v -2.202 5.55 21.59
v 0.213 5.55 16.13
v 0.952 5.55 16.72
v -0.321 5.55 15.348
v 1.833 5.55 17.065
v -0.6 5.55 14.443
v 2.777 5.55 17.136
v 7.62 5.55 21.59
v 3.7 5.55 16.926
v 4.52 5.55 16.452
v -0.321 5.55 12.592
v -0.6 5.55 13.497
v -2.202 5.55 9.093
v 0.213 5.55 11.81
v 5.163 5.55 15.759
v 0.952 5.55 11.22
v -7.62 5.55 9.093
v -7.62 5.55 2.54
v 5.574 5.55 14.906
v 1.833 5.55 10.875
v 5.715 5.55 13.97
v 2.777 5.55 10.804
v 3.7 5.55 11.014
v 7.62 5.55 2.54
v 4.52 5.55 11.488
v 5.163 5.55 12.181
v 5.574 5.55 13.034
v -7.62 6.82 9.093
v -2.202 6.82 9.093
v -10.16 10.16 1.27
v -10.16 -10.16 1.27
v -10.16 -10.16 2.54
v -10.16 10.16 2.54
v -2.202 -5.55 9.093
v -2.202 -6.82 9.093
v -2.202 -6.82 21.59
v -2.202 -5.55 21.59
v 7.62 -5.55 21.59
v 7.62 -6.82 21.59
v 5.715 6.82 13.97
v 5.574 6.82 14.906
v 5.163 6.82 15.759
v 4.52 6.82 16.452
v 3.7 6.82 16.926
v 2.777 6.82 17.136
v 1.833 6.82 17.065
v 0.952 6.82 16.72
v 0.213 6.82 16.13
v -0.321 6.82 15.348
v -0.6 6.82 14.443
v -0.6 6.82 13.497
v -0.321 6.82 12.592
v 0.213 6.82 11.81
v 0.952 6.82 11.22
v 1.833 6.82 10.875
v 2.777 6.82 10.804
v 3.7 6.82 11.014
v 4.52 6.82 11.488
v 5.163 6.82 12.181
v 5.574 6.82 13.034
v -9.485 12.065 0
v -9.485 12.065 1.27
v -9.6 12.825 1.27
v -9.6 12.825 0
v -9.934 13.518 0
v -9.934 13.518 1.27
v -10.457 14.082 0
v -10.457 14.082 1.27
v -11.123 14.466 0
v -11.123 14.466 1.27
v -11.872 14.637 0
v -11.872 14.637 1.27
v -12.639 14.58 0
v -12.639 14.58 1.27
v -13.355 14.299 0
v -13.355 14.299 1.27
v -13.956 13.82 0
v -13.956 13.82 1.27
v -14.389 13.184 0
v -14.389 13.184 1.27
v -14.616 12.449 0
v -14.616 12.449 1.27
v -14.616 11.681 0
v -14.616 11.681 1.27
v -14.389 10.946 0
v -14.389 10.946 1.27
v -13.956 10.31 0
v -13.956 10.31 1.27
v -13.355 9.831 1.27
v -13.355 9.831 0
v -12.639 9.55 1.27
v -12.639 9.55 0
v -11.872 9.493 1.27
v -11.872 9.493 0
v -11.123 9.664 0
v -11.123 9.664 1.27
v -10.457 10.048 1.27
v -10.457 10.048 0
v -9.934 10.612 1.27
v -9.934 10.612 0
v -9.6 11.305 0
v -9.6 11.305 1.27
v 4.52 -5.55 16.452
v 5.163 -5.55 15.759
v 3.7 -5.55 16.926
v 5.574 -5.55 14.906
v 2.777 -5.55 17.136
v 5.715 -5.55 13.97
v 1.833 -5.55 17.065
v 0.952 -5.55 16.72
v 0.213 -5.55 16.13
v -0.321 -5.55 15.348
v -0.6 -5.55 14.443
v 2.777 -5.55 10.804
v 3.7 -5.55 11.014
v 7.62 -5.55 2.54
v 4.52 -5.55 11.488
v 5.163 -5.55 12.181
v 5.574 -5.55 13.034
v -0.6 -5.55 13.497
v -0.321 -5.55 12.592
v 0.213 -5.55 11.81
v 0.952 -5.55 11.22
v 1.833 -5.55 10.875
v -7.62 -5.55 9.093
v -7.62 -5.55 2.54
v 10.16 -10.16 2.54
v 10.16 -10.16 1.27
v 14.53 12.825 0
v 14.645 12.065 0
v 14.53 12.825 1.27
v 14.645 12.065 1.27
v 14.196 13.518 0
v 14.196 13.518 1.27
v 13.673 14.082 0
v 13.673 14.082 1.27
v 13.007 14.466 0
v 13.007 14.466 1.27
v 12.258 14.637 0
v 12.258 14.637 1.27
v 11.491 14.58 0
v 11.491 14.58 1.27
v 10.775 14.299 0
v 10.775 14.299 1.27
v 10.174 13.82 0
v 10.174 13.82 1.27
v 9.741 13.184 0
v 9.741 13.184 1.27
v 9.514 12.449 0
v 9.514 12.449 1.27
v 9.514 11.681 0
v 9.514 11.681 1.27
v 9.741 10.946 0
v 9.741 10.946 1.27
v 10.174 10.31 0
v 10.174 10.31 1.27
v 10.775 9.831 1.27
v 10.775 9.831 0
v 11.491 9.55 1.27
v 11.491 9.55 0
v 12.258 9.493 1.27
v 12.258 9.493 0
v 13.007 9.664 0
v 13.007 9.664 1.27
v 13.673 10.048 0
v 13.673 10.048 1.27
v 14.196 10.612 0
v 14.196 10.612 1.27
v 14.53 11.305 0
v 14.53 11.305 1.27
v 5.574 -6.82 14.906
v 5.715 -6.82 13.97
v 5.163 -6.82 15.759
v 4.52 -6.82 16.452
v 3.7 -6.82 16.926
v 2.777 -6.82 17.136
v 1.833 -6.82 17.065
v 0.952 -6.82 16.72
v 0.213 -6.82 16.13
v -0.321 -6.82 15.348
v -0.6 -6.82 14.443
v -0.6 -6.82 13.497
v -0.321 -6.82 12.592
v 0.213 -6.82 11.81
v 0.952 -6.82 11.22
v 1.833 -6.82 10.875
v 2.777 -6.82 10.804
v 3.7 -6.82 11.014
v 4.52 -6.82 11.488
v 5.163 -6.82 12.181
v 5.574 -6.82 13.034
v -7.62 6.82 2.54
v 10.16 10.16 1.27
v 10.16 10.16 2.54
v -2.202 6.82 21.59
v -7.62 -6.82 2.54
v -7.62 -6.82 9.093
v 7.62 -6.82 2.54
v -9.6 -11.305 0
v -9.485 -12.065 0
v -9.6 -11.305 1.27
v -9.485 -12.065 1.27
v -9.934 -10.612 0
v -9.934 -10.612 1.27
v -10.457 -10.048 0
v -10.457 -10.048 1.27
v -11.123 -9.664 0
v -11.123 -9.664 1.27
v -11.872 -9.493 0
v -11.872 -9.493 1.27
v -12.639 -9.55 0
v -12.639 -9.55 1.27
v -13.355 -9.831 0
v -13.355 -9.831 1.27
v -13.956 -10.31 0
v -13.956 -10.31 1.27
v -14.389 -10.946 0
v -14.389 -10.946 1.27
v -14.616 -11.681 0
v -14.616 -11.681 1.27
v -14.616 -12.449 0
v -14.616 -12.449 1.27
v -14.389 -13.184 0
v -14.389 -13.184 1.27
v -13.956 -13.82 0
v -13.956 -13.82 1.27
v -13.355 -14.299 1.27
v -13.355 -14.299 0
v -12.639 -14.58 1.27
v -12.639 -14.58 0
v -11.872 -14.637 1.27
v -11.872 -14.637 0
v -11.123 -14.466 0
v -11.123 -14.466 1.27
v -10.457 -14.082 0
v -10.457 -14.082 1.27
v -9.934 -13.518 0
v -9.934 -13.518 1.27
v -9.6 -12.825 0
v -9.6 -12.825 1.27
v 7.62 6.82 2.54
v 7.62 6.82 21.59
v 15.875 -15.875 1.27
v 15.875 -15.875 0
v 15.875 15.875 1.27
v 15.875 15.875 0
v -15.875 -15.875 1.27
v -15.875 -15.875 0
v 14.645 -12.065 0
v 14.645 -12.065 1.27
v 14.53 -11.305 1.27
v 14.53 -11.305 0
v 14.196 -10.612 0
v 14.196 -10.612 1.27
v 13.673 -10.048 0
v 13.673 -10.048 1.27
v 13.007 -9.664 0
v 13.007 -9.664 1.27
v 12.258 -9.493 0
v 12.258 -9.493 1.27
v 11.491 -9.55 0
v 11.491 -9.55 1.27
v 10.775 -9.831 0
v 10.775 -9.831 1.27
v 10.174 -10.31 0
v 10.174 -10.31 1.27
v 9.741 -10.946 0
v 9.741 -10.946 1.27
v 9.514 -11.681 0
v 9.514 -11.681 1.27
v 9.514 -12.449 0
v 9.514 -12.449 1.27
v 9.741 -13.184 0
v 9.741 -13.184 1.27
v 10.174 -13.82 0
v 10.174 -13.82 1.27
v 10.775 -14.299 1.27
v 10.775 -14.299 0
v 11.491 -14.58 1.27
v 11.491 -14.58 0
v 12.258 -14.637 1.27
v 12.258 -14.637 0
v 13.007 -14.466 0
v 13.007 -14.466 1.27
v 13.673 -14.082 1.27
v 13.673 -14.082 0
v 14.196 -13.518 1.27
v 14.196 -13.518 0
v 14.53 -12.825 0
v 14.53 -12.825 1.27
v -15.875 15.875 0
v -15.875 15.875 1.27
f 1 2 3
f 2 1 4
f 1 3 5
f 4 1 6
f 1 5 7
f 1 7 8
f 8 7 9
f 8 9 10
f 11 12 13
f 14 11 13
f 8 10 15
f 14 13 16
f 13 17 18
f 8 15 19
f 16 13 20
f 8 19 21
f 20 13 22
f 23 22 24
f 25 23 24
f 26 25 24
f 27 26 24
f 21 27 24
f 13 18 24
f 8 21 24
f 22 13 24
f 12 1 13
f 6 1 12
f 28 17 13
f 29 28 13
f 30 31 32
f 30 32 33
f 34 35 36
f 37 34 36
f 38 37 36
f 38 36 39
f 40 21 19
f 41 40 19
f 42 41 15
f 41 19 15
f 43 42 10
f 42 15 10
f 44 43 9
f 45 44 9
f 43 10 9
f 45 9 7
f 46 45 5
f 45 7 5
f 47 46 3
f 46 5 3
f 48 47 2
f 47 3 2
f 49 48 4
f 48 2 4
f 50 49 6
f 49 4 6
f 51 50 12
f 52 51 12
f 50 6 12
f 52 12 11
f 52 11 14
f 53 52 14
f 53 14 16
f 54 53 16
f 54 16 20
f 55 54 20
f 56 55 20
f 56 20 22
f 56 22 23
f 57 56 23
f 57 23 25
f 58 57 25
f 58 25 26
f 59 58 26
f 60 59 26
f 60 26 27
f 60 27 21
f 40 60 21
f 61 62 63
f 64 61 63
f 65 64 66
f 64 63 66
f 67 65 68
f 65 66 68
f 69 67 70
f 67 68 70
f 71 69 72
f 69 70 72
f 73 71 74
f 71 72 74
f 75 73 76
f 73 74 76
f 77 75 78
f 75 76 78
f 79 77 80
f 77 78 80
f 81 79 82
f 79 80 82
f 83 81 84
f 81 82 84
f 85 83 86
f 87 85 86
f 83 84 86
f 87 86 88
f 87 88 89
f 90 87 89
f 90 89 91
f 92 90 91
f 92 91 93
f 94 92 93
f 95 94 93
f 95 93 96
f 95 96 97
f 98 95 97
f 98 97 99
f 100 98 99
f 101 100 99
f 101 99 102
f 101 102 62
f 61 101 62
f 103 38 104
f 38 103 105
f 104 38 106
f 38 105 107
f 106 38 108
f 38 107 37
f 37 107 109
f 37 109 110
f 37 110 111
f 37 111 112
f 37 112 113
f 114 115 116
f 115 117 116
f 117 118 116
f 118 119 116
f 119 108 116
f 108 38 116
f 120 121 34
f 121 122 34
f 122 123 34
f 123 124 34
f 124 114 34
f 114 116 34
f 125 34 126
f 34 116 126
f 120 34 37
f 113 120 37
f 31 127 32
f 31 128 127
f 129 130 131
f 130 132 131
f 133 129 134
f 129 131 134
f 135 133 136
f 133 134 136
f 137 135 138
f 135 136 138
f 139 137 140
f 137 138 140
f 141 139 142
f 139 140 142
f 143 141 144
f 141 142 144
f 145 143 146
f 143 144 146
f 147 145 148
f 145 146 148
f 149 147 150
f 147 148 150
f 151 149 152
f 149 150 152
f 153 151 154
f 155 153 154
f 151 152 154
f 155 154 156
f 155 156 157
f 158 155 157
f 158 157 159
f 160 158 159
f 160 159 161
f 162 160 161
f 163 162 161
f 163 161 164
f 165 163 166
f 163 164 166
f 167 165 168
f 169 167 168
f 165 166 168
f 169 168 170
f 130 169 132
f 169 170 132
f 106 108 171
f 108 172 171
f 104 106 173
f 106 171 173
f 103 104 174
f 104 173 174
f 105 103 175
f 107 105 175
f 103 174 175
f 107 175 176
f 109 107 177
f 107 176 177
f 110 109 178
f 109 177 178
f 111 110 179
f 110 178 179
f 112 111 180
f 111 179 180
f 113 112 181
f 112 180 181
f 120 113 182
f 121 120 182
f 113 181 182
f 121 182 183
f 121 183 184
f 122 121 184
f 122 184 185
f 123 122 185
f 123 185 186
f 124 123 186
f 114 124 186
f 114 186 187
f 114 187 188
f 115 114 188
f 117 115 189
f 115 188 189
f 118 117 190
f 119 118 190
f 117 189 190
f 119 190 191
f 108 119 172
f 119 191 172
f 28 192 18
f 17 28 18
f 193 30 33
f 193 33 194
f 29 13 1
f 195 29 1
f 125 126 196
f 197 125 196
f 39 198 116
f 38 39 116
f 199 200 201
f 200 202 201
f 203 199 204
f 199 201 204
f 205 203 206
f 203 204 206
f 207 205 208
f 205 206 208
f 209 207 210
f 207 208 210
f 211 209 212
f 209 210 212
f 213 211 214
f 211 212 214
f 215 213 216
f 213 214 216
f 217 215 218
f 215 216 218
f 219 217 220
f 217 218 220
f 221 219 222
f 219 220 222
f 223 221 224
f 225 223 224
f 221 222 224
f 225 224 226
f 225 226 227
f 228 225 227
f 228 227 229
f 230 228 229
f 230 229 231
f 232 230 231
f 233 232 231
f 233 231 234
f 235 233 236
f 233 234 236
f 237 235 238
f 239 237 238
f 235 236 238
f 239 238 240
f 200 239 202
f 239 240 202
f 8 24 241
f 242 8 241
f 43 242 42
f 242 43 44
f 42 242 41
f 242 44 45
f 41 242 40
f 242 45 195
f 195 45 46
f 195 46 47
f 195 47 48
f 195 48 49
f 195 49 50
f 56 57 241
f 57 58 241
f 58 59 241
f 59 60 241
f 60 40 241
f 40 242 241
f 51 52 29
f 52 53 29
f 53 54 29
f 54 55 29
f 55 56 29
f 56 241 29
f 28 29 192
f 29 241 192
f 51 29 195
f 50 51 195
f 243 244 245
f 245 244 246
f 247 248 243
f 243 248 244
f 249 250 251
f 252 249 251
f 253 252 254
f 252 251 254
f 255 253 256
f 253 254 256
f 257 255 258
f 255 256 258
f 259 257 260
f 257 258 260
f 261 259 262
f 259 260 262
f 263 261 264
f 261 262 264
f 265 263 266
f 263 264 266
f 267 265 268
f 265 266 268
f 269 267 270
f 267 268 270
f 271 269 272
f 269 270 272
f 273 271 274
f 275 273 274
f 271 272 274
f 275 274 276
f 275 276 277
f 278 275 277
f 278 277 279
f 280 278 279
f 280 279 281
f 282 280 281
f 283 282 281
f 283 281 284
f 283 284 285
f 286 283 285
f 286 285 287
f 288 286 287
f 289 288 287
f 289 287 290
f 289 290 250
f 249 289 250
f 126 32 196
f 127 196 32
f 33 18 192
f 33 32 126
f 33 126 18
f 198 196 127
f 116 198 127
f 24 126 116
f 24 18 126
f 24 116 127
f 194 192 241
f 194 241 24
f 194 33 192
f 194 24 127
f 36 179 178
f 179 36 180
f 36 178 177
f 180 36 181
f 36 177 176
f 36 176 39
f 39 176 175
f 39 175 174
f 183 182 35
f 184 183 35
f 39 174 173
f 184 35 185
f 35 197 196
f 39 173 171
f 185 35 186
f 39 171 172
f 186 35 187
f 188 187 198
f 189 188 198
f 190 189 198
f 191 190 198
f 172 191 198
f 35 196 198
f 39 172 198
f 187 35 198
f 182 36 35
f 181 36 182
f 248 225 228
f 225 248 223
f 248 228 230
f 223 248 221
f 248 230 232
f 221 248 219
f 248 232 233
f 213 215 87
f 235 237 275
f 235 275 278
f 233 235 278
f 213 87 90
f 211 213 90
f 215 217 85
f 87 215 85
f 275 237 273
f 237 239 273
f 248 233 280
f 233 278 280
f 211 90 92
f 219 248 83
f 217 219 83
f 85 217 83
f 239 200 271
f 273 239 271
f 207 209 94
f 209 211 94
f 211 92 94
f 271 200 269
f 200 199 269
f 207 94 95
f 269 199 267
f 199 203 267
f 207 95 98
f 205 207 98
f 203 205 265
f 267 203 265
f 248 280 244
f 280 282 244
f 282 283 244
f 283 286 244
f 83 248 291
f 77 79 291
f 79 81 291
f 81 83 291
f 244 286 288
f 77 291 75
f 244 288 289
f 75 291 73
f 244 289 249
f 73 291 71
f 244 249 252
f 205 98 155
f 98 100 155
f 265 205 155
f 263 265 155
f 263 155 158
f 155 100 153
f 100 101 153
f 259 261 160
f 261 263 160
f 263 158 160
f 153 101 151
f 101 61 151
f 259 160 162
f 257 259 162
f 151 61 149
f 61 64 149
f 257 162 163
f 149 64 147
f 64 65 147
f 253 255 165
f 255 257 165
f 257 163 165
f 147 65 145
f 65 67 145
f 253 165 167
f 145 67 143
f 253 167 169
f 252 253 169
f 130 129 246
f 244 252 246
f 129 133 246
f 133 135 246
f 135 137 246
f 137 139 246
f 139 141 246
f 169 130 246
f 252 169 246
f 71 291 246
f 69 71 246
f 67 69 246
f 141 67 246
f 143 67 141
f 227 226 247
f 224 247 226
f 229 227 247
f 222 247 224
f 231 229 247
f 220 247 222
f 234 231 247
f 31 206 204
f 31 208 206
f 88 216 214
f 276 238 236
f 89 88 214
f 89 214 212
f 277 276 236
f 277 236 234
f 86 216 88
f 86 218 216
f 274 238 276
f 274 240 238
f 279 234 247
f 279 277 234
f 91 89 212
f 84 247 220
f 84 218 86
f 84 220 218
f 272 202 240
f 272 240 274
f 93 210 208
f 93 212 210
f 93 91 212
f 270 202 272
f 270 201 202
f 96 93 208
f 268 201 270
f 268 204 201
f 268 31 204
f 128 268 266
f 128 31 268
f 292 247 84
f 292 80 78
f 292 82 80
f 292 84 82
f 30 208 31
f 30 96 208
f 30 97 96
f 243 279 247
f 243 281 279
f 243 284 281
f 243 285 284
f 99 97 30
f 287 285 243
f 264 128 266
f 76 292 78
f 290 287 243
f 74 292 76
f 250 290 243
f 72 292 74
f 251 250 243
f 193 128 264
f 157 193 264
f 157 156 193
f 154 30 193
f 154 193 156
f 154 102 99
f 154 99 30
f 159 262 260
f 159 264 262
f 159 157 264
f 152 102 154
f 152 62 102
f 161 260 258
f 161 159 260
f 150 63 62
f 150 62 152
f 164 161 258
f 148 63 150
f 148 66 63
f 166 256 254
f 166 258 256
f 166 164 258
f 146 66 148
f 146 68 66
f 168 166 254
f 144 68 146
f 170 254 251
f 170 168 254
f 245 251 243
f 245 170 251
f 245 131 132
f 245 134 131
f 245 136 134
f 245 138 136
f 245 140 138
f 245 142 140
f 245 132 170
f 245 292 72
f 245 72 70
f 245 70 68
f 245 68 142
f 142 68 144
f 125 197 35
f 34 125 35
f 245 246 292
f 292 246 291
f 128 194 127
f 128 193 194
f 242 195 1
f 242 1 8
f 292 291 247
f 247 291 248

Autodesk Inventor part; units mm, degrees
ref_plane "YZ Plane" through (0, 0, 0) normal (1, 0, 0) x (0, 1, 0)
ref_plane "XZ Plane" through (0, 0, 0) normal (0, 1, 0) x (-1, 0, 0)
ref_plane "XY Plane" through (0, 0, 0) normal (0, 0, 1) x (1, 0, 0)
sketch "Sketch1" plane through (0, 0, 0) normal (0, 0, 1) x (1, 0, 0)
  line L0 (15.875, 15.875) -> (-15.875, 15.875)
  line L1 (-15.875, 15.875) -> (-15.875, -15.875)
  line L2 (-15.875, -15.875) -> (15.875, -15.875)
  line L3 (15.875, -15.875) -> (15.875, 15.875)
  line L4 (15.875, 15.875) -> (-15.875, -15.875) construction
  line L5 (-15.875, 15.875) -> (15.875, -15.875) construction
  point P0 (0, 0)
  dimension "d0" = 31.75
  dimension "d1" = 31.75
extrude "Extrusion1" add sketch "Sketch1" along normal blind 1.27
sketch "Sketch2" plane through (0, 0, 1.27) normal (0, 0, 1) x (1, 0, 0)
  line L0 (-10.16, 10.16) -> (10.16, 10.16)
  line L1 (10.16, 10.16) -> (10.16, -10.16)
  line L2 (10.16, -10.16) -> (-10.16, -10.16)
  line L3 (-10.16, -10.16) -> (-10.16, 10.16)
  line L4 (15.875, 15.875) -> (-15.875, 15.875) projected
  line L5 (15.875, -15.875) -> (15.875, 15.875) projected
  line L6 (-15.875, -15.875) -> (15.875, -15.875) projected
  line L7 (-15.875, 15.875) -> (-15.875, -15.875) projected
  point P0 (0, 0)
  dimension "d4" = 5.715
  dimension "d5" = 5.715
  dimension "d6" = 5.715
  dimension "d7" = 5.715
extrude "Extrusion2" add sketch "Sketch2" along normal blind 1.27 contours L0 L1 L2 L3
sketch "Sketch3" plane through (0, 0, 2.54) normal (0, 0, 1) x (1, 0, 0)
  line L0 (-7.62, 5.5499) -> (7.62, 5.5499)
  line L1 (7.62, 5.5499) -> (7.62, 6.8199)
  line L2 (7.62, 6.8199) -> (-7.62, 6.8199)
  line L3 (-7.62, 6.8199) -> (-7.62, 5.5499)
  line L4 (10.16, -10.16) -> (10.16, 10.16) projected
  line L5 (-10.16, 10.16) -> (-10.16, -10.16) projected
  line L6 (10.16, 10.16) -> (-10.16, 10.16) projected
  line L7 (-7.62, -6.8199) -> (7.62, -6.8199)
  line L8 (7.62, -6.8199) -> (7.62, -5.5499)
  line L9 (7.62, -5.5499) -> (-7.62, -5.5499)
  line L10 (-7.62, -5.5499) -> (-7.62, -6.8199)
  line L11 (-10.16, -10.16) -> (10.16, -10.16) projected
  point P0 (0, 0)
  dimension "d49" = 11.0998
  dimension "d50" = 1.27
  dimension "d60" = 1.27
  dimension "d61" = 5.5499
extrude "Extrusion3" add sketch "Sketch3" along normal blind 19.05 contours L3 L2 L1 L0 | L10 L9 L8 L7
sketch "Sketch4" plane through (-7.62, -6.8199, 2.54) normal (0, -1, 0) x (1, 0, 0)
  circle A0 centre (10.16, 11.43) radius 3.175
  line L0 (0, 19.05) -> (15.24, 19.05) projected
  line L1 (0, 0) -> (0, 19.05) projected
  point P0 (7.62, -2.54)
  dimension "d20" = 6.35
  dimension "d21" = 7.62
  dimension "d44" = 10.16
extrude "Extrusion4" cut sketch "Sketch4" against normal blind 127
sketch "Sketch5" plane through (0, 0, 1.27) normal (0, 0, 1) x (1, 0, 0)
  circle A0 centre (-12.065, 12.065) radius 2.5797
  line L0 (-15.875, -15.875) -> (15.875, -15.875) projected
  line L1 (15.875, -15.875) -> (15.875, 15.875) projected
  circle A1 centre (12.065, 12.065) radius 2.5797
  line L2 (15.875, 15.875) -> (-15.875, 15.875) projected
  line L3 (-15.875, 15.875) -> (-15.875, -15.875) projected
  circle A2 centre (-12.065, -12.065) radius 2.5797
  circle A3 centre (12.065, -12.065) radius 2.5797
  point P0 (0, 0)
  dimension "d24" = 5.1594
  dimension "d28" = 5.1594
  dimension "d29" = 3.81
  dimension "d30" = 3.81
  dimension "d31" = 3.81
  dimension "d32" = 3.81
  dimension "d33" = 5.1594
  dimension "d34" = 3.81
  dimension "d35" = 3.81
  dimension "d36" = 5.1594
  dimension "d37" = 3.81
  dimension "d38" = 3.81
extrude "Extrusion5" cut sketch "Sketch5" against normal blind 12.7 contours A0 | A1 | A2 | A3
sketch "Sketch6" plane through (-7.62, -6.8199, 2.54) normal (0, -1, 0) x (1, 0, 0)
  line L0 (0, 0) -> (0, 19.05) projected
  line L1 (0, 19.05) -> (15.24, 19.05) projected
  line L2 (0, 6.5528) -> (5.4184, 6.5528)
  line L3 (5.4184, 6.5528) -> (5.4184, 19.05)
  line L4 (5.4184, 19.05) -> (0, 19.05)
  line L5 (0, 19.05) -> (0, 6.5528)
  point P0 (7.62, -2.54)
extrude "Extrusion6" cut sketch "Sketch6" against normal blind 101.6
equation "\"d5\" = d4"
equation "\"d6\" = d4"
equation "\"d7\" = d4"
equation "\"d50\" = d60"
equation "\"d61\" = 0.5 * d49"
equation "\"d28\" = d24"
equation "\"d30\" = d29"
equation "\"d31\" = d29"
equation "\"d32\" = d29"
equation "\"d33\" = d24"
equation "\"d34\" = d29"
equation "\"d35\" = d29"
equation "\"d36\" = d24"
equation "\"d37\" = d29"
equation "\"d38\" = d29"
properties part number "pneumatics back holder"
